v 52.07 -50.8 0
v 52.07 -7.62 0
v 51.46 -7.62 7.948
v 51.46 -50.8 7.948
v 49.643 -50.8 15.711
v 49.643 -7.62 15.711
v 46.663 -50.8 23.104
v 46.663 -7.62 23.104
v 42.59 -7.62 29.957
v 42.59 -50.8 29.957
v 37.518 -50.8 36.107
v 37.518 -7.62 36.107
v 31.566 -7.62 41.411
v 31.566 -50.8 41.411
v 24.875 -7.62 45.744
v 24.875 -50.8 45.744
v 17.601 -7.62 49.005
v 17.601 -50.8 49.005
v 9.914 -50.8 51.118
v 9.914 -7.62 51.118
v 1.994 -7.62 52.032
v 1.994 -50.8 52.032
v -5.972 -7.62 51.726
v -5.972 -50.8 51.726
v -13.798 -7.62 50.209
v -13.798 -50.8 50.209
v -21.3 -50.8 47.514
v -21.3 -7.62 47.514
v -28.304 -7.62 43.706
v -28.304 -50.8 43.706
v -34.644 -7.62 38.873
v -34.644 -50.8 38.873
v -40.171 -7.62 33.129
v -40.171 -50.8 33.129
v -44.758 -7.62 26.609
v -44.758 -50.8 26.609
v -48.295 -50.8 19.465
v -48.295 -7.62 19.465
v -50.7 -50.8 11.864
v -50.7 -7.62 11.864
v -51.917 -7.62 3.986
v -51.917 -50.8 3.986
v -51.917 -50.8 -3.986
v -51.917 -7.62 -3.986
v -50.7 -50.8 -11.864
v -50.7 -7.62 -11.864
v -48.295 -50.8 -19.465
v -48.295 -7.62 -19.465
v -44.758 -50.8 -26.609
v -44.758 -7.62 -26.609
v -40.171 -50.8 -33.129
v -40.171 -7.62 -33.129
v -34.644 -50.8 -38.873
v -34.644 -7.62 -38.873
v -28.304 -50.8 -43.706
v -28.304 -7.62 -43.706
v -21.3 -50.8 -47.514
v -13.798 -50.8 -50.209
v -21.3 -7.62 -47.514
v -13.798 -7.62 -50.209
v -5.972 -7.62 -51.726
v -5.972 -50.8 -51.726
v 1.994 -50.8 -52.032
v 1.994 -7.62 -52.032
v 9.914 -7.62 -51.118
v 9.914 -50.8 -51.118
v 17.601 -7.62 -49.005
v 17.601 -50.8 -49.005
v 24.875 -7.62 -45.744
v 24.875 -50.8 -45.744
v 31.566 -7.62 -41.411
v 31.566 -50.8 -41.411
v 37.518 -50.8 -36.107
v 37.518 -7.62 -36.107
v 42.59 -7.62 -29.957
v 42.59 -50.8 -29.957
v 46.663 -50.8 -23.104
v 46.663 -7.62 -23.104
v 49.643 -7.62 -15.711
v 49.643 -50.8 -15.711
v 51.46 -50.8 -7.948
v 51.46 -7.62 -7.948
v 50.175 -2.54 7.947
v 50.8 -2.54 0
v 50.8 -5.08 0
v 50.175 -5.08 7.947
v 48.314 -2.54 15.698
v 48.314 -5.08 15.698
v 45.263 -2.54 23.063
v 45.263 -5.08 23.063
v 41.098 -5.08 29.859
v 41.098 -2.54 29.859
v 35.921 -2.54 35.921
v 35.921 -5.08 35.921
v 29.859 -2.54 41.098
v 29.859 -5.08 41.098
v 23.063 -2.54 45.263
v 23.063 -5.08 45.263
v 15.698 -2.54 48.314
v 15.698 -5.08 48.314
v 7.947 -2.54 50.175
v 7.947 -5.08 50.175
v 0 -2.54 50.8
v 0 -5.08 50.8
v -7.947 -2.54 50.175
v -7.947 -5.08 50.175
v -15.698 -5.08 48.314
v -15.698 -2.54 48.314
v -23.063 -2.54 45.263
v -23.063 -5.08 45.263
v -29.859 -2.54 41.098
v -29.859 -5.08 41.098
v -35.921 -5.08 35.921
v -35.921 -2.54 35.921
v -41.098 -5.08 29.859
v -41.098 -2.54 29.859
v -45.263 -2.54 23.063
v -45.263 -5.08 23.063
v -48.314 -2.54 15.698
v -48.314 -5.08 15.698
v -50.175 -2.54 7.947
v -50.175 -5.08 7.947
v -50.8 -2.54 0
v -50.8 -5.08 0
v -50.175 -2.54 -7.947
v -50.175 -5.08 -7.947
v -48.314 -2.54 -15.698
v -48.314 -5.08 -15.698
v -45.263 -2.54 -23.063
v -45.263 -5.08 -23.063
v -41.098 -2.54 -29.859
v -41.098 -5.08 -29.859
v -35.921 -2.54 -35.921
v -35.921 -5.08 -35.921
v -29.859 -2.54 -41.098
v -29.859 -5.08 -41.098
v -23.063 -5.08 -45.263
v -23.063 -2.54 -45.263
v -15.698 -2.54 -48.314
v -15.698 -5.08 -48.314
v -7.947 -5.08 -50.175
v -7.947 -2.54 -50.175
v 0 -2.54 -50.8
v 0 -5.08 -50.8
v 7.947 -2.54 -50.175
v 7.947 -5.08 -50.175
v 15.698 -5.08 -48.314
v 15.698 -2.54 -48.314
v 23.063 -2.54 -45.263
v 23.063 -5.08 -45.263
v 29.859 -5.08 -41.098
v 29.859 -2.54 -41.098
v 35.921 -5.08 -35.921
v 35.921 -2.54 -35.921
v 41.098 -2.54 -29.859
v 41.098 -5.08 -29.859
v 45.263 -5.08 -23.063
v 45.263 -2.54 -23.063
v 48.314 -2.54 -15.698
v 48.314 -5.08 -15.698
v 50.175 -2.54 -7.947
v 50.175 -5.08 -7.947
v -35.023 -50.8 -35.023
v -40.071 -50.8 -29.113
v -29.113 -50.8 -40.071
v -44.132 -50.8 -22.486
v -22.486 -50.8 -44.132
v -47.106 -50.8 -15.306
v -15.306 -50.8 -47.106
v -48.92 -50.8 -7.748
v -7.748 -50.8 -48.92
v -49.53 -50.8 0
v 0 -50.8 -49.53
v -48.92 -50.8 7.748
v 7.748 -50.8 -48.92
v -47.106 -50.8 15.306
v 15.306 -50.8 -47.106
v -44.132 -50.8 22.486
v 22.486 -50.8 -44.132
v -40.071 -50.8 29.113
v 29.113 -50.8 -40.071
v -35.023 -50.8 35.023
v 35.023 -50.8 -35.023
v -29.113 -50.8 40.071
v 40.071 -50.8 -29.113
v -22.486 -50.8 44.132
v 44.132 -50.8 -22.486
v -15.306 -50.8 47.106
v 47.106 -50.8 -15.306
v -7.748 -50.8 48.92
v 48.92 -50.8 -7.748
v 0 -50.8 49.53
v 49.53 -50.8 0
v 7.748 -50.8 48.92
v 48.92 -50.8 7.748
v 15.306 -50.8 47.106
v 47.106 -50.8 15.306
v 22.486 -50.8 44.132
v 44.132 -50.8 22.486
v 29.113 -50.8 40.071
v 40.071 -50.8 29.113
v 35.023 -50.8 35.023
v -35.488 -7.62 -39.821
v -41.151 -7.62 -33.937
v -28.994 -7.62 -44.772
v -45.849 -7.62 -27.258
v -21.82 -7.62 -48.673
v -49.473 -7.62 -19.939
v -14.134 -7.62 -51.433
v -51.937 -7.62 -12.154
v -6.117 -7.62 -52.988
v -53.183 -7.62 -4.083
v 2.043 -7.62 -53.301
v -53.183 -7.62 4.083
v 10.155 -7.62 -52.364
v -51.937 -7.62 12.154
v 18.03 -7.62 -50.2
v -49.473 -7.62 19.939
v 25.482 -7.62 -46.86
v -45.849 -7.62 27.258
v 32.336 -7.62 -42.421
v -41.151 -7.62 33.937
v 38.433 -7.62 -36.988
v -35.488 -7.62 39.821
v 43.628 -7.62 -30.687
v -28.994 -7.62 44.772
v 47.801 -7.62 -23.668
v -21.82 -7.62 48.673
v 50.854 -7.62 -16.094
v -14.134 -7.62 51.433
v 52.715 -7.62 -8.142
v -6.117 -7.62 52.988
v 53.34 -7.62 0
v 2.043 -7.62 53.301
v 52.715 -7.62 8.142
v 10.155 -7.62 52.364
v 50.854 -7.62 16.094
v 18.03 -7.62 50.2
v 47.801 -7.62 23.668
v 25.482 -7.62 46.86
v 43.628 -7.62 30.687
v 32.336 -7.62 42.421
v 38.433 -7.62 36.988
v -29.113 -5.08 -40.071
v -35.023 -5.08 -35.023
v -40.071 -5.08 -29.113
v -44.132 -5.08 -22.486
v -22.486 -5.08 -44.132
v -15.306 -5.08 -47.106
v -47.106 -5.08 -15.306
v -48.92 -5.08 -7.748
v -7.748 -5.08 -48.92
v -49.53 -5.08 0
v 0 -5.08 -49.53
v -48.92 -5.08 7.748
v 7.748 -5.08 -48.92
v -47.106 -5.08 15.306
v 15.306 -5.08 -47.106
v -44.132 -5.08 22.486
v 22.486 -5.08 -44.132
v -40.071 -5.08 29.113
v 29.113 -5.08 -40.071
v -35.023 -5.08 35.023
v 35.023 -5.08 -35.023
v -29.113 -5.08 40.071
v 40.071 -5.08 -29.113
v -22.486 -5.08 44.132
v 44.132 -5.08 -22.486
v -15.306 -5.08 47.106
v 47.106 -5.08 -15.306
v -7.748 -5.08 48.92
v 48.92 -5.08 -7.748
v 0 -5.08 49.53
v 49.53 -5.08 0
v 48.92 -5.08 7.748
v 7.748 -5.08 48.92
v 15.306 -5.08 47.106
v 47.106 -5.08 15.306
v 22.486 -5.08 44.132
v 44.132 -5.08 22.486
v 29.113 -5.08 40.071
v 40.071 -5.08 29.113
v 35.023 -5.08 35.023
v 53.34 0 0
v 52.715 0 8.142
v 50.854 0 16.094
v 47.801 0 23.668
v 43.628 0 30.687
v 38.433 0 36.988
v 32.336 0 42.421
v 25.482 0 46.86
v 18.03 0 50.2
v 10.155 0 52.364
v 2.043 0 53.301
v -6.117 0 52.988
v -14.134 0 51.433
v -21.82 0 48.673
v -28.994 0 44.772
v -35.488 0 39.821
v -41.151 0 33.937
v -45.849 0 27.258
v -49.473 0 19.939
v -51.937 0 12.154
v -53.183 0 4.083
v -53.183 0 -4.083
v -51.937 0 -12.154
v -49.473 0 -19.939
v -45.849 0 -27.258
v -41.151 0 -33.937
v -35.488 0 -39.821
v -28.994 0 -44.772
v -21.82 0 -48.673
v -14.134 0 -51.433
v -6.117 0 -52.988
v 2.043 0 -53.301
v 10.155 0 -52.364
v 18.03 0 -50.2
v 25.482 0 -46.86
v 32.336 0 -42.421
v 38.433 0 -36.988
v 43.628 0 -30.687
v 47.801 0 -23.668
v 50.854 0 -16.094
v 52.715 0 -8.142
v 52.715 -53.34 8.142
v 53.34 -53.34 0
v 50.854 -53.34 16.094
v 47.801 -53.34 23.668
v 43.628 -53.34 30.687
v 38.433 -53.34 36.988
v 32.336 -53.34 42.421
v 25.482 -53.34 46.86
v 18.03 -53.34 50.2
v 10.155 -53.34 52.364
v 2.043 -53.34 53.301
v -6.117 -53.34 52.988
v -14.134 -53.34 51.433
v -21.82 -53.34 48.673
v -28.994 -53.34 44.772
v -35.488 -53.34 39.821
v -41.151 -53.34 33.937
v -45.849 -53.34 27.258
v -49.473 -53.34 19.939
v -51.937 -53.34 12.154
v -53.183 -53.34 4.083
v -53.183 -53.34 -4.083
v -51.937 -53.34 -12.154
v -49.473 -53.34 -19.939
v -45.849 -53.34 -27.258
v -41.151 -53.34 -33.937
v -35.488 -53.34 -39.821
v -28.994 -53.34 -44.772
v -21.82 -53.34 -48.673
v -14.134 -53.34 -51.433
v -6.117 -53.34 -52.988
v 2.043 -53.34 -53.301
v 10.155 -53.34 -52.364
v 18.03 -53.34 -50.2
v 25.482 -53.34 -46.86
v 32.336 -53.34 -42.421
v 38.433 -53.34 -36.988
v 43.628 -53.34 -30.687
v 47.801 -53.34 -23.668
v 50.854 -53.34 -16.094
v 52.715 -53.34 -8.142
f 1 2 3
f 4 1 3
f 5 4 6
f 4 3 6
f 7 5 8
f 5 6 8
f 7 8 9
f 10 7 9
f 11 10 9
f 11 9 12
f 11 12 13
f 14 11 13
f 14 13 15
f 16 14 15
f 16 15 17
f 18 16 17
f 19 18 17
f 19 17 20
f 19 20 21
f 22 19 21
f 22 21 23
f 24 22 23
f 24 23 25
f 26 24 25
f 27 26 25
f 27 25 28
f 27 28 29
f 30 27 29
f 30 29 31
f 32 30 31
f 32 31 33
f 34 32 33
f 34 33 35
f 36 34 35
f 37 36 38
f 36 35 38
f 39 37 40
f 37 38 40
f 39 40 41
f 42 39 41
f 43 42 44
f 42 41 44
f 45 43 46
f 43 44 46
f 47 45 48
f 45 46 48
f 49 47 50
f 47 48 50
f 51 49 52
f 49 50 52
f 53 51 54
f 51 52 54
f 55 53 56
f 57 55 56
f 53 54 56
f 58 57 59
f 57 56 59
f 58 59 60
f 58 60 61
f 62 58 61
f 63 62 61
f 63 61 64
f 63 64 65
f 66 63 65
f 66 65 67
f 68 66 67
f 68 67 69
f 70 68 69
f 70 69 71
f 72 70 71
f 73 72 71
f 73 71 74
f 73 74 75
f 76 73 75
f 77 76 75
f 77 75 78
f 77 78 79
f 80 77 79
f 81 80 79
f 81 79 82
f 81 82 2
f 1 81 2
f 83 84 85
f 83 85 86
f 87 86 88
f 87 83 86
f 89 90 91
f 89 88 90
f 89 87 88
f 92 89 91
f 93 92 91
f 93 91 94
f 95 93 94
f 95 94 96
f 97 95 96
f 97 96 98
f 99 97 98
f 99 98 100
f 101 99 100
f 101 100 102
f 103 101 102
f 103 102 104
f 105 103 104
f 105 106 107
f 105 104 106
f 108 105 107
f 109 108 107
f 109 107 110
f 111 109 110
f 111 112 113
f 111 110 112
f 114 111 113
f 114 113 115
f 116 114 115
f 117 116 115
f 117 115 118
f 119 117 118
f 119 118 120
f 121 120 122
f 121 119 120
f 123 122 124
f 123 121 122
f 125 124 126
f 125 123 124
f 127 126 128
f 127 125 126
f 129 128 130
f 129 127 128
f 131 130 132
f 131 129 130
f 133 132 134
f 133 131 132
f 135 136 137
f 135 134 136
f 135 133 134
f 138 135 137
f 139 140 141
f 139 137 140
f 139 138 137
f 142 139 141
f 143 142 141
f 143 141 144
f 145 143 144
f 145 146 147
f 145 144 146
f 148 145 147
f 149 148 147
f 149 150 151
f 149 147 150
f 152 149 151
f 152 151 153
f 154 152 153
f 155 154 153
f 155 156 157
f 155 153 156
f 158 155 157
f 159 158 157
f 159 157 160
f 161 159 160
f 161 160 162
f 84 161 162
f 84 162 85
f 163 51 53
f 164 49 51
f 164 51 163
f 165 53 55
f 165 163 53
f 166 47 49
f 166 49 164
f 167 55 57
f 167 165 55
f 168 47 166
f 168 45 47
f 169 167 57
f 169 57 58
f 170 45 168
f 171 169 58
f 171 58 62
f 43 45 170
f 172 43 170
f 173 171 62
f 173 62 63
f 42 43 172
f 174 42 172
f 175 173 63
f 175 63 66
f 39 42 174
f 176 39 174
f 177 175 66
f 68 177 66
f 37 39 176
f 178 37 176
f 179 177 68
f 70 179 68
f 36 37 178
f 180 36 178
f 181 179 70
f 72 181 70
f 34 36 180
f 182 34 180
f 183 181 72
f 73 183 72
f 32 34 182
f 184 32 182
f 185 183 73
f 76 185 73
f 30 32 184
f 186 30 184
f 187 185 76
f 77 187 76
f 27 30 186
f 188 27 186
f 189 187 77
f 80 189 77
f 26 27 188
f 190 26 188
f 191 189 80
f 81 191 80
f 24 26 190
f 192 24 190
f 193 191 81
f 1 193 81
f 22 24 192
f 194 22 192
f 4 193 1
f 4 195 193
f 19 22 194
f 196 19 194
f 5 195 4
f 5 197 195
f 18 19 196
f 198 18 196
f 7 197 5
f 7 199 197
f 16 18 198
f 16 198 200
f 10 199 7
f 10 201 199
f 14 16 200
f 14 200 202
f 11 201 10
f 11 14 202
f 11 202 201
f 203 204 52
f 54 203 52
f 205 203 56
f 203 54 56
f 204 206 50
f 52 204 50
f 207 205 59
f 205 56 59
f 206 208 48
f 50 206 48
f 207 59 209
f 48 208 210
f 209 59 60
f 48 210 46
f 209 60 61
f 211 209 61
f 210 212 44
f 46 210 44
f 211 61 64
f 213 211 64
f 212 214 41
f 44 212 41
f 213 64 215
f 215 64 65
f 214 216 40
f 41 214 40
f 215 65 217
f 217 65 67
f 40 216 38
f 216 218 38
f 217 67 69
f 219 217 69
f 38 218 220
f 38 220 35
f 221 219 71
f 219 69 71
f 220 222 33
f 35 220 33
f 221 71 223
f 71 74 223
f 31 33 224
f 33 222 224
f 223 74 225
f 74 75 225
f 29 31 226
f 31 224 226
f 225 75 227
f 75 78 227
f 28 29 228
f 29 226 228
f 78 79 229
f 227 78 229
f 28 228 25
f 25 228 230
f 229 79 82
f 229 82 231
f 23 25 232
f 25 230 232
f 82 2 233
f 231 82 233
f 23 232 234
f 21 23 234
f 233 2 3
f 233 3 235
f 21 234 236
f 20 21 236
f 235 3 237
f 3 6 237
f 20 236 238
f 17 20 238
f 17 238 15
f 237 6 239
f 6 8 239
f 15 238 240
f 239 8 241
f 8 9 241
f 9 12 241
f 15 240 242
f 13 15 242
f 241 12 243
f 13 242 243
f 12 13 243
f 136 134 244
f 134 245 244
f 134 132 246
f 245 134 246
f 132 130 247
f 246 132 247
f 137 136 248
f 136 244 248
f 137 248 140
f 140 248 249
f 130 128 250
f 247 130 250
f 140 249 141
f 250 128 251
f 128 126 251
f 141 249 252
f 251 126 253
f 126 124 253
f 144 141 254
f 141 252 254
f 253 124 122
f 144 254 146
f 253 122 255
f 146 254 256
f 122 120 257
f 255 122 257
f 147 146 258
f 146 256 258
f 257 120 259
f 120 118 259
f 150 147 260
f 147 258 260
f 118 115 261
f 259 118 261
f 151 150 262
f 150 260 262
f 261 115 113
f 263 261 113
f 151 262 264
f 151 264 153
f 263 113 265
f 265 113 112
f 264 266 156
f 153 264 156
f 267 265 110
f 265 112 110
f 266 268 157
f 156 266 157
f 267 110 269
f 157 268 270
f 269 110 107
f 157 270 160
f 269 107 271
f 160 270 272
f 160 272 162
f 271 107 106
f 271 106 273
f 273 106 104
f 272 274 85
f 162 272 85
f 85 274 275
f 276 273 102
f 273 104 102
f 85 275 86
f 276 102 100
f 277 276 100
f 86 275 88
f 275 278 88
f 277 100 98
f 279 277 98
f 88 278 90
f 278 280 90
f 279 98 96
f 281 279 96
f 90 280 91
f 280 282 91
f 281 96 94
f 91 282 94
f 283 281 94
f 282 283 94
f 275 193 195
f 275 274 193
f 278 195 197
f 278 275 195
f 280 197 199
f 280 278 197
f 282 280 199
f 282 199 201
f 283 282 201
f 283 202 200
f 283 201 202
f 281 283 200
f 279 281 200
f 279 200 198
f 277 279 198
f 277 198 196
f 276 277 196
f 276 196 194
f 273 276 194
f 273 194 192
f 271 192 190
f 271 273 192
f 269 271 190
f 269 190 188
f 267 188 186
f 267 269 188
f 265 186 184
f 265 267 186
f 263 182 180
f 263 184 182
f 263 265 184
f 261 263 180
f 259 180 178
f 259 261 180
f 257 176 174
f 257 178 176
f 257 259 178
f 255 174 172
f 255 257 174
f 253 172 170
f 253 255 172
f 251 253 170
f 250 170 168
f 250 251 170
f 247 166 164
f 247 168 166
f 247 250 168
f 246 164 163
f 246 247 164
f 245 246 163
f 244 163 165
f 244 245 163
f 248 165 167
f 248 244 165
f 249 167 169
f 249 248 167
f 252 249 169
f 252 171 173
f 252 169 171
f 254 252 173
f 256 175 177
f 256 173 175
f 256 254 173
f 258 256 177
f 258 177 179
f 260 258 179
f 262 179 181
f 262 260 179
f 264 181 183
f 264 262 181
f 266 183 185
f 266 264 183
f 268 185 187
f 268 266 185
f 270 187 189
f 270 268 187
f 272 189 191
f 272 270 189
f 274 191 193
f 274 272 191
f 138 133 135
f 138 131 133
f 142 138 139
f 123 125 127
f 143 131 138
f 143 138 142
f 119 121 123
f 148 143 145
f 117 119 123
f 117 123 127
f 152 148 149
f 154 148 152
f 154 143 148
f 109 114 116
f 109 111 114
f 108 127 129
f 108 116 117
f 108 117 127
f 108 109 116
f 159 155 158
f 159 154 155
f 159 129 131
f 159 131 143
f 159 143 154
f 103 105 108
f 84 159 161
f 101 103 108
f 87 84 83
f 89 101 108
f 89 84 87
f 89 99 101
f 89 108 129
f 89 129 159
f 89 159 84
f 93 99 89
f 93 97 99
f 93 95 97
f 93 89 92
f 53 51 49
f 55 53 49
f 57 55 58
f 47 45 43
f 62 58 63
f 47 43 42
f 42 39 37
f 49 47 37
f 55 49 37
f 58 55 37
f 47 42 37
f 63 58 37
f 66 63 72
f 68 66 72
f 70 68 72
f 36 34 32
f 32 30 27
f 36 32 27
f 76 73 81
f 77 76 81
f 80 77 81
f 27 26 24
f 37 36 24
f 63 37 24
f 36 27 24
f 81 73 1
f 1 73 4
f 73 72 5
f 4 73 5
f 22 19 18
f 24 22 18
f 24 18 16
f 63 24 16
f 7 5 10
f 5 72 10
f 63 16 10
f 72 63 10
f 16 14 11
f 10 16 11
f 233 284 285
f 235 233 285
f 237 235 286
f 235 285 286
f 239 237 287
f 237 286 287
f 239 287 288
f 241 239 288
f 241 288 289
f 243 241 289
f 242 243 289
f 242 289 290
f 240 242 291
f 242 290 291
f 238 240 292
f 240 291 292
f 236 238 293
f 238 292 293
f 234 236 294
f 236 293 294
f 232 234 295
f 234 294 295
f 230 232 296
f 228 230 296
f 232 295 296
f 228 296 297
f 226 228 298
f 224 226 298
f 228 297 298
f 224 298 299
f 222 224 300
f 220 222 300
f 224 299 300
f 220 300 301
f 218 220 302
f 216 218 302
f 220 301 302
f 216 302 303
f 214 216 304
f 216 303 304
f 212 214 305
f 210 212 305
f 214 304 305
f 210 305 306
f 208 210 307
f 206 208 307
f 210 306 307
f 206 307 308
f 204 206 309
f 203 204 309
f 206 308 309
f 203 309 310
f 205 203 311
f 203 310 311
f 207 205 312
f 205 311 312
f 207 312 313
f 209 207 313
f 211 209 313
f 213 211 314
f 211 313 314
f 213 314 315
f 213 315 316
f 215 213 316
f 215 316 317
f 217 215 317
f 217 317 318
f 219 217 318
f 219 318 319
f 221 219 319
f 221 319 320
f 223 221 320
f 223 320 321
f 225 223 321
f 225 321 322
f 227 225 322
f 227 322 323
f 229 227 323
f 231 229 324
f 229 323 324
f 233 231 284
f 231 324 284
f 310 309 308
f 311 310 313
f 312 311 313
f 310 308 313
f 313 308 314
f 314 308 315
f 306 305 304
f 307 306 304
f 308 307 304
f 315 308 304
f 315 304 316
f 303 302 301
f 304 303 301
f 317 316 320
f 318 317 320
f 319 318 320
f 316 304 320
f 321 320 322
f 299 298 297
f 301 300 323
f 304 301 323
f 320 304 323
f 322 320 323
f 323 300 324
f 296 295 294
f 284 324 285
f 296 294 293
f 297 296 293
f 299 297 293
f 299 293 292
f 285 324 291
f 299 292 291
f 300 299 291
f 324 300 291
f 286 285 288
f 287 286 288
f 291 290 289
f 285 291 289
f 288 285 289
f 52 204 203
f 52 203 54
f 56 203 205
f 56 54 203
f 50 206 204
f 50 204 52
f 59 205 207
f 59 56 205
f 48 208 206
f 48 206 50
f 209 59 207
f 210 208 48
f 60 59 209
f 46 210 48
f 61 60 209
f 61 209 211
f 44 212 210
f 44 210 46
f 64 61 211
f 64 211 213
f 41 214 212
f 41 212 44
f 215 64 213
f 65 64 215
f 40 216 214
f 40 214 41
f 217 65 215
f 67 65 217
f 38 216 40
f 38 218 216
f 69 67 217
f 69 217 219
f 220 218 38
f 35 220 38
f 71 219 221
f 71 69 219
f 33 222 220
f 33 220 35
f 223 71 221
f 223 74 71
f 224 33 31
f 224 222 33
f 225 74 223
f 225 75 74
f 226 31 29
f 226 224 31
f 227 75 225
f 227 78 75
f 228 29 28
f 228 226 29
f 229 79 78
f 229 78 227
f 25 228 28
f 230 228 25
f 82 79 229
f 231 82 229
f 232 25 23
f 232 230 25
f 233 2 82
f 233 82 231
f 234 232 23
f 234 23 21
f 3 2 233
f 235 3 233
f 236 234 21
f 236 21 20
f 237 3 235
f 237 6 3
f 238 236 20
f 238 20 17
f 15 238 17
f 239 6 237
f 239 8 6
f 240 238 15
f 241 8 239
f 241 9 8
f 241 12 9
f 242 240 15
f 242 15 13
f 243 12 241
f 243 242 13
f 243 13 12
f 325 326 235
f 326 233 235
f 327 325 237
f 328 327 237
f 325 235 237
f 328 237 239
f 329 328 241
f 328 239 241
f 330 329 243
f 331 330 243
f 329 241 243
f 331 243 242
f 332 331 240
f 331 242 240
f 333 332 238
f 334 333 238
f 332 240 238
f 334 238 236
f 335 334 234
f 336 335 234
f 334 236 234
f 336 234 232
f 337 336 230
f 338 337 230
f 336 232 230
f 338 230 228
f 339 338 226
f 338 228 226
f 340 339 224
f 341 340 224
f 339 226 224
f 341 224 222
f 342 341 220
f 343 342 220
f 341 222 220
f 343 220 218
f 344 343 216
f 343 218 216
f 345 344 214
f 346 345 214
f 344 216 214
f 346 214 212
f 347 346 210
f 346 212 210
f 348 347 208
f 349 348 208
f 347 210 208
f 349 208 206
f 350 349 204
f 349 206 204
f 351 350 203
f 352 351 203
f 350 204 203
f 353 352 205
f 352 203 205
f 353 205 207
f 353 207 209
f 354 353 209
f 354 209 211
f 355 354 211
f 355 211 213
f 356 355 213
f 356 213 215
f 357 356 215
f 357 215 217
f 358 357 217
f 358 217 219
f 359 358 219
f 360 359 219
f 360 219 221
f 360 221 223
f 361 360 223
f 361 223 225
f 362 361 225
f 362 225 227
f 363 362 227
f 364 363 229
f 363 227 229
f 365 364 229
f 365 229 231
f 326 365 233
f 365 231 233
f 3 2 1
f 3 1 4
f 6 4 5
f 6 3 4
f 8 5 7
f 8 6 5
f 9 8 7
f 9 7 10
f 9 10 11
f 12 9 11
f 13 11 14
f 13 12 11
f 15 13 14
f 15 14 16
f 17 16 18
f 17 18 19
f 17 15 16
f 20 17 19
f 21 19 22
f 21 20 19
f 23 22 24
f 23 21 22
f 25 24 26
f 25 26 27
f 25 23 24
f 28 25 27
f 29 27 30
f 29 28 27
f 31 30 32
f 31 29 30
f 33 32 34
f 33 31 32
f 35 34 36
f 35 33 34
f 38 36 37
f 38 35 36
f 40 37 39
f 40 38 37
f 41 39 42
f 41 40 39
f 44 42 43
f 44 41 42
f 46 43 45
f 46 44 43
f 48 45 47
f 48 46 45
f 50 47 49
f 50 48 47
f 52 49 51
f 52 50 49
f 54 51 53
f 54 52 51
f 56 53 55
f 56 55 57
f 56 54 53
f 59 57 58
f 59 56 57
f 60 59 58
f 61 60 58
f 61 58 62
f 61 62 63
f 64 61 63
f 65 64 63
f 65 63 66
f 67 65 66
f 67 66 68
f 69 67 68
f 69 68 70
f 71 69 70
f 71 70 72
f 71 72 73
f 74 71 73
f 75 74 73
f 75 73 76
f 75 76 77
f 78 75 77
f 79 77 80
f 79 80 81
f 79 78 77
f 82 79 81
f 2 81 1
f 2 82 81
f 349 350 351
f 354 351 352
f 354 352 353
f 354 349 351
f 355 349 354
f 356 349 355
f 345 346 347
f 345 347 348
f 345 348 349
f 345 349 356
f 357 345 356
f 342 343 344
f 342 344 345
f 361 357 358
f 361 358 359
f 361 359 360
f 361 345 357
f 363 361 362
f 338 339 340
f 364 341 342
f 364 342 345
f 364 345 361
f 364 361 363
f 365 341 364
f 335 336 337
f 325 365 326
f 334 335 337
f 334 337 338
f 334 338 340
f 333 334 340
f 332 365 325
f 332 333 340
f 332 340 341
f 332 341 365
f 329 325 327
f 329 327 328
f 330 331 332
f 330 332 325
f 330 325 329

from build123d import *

# Parameters (mm, degrees)
F2_R     = 52.07
F3_DEPTH = 50.8
F2_R_2   = 53.34
F0_DEPTH = 7.62
F1_DEPTH = 43.18
F4_T     = -2.54
F5_R     = 53.34
F6_DEPTH = 2.54


with BuildPart() as f3:
    # F2 (on Front) → F3 (new body)
    with BuildSketch(Plane.XZ):
        Circle(F2_R)
    extrude(amount=F3_DEPTH)

    # F2 (on Front) → F0 (join)
    with BuildSketch(Plane.XZ):
        Circle(F2_R_2)
        Circle(F2_R, mode=Mode.SUBTRACT)
    extrude(amount=F0_DEPTH)


with BuildPart() as f1:
    # F1 (new): a face of the model
    f1_faces = [f3.part.faces().sort_by_distance(p)[0] for p in [
        (-53.1891316972, -7.62, 0),
    ]]
    extrude(f1_faces, amount=F1_DEPTH)

    # F5 (on face) → F6 (join)
    with BuildSketch(Plane.XZ.offset(50.8)):
        Circle(F5_R)
    extrude(amount=F6_DEPTH)


with BuildPart() as f3_1:
    add(f3.part)

    # F4
    f4_openings = [f3_1.faces().sort_by_distance(p)[0] for p in [
        (0, -50.8, 0),
    ]]
    offset(amount=F4_T, openings=f4_openings, kind=Kind.INTERSECTION)


solid = Compound([f1.part, f3_1.part])
